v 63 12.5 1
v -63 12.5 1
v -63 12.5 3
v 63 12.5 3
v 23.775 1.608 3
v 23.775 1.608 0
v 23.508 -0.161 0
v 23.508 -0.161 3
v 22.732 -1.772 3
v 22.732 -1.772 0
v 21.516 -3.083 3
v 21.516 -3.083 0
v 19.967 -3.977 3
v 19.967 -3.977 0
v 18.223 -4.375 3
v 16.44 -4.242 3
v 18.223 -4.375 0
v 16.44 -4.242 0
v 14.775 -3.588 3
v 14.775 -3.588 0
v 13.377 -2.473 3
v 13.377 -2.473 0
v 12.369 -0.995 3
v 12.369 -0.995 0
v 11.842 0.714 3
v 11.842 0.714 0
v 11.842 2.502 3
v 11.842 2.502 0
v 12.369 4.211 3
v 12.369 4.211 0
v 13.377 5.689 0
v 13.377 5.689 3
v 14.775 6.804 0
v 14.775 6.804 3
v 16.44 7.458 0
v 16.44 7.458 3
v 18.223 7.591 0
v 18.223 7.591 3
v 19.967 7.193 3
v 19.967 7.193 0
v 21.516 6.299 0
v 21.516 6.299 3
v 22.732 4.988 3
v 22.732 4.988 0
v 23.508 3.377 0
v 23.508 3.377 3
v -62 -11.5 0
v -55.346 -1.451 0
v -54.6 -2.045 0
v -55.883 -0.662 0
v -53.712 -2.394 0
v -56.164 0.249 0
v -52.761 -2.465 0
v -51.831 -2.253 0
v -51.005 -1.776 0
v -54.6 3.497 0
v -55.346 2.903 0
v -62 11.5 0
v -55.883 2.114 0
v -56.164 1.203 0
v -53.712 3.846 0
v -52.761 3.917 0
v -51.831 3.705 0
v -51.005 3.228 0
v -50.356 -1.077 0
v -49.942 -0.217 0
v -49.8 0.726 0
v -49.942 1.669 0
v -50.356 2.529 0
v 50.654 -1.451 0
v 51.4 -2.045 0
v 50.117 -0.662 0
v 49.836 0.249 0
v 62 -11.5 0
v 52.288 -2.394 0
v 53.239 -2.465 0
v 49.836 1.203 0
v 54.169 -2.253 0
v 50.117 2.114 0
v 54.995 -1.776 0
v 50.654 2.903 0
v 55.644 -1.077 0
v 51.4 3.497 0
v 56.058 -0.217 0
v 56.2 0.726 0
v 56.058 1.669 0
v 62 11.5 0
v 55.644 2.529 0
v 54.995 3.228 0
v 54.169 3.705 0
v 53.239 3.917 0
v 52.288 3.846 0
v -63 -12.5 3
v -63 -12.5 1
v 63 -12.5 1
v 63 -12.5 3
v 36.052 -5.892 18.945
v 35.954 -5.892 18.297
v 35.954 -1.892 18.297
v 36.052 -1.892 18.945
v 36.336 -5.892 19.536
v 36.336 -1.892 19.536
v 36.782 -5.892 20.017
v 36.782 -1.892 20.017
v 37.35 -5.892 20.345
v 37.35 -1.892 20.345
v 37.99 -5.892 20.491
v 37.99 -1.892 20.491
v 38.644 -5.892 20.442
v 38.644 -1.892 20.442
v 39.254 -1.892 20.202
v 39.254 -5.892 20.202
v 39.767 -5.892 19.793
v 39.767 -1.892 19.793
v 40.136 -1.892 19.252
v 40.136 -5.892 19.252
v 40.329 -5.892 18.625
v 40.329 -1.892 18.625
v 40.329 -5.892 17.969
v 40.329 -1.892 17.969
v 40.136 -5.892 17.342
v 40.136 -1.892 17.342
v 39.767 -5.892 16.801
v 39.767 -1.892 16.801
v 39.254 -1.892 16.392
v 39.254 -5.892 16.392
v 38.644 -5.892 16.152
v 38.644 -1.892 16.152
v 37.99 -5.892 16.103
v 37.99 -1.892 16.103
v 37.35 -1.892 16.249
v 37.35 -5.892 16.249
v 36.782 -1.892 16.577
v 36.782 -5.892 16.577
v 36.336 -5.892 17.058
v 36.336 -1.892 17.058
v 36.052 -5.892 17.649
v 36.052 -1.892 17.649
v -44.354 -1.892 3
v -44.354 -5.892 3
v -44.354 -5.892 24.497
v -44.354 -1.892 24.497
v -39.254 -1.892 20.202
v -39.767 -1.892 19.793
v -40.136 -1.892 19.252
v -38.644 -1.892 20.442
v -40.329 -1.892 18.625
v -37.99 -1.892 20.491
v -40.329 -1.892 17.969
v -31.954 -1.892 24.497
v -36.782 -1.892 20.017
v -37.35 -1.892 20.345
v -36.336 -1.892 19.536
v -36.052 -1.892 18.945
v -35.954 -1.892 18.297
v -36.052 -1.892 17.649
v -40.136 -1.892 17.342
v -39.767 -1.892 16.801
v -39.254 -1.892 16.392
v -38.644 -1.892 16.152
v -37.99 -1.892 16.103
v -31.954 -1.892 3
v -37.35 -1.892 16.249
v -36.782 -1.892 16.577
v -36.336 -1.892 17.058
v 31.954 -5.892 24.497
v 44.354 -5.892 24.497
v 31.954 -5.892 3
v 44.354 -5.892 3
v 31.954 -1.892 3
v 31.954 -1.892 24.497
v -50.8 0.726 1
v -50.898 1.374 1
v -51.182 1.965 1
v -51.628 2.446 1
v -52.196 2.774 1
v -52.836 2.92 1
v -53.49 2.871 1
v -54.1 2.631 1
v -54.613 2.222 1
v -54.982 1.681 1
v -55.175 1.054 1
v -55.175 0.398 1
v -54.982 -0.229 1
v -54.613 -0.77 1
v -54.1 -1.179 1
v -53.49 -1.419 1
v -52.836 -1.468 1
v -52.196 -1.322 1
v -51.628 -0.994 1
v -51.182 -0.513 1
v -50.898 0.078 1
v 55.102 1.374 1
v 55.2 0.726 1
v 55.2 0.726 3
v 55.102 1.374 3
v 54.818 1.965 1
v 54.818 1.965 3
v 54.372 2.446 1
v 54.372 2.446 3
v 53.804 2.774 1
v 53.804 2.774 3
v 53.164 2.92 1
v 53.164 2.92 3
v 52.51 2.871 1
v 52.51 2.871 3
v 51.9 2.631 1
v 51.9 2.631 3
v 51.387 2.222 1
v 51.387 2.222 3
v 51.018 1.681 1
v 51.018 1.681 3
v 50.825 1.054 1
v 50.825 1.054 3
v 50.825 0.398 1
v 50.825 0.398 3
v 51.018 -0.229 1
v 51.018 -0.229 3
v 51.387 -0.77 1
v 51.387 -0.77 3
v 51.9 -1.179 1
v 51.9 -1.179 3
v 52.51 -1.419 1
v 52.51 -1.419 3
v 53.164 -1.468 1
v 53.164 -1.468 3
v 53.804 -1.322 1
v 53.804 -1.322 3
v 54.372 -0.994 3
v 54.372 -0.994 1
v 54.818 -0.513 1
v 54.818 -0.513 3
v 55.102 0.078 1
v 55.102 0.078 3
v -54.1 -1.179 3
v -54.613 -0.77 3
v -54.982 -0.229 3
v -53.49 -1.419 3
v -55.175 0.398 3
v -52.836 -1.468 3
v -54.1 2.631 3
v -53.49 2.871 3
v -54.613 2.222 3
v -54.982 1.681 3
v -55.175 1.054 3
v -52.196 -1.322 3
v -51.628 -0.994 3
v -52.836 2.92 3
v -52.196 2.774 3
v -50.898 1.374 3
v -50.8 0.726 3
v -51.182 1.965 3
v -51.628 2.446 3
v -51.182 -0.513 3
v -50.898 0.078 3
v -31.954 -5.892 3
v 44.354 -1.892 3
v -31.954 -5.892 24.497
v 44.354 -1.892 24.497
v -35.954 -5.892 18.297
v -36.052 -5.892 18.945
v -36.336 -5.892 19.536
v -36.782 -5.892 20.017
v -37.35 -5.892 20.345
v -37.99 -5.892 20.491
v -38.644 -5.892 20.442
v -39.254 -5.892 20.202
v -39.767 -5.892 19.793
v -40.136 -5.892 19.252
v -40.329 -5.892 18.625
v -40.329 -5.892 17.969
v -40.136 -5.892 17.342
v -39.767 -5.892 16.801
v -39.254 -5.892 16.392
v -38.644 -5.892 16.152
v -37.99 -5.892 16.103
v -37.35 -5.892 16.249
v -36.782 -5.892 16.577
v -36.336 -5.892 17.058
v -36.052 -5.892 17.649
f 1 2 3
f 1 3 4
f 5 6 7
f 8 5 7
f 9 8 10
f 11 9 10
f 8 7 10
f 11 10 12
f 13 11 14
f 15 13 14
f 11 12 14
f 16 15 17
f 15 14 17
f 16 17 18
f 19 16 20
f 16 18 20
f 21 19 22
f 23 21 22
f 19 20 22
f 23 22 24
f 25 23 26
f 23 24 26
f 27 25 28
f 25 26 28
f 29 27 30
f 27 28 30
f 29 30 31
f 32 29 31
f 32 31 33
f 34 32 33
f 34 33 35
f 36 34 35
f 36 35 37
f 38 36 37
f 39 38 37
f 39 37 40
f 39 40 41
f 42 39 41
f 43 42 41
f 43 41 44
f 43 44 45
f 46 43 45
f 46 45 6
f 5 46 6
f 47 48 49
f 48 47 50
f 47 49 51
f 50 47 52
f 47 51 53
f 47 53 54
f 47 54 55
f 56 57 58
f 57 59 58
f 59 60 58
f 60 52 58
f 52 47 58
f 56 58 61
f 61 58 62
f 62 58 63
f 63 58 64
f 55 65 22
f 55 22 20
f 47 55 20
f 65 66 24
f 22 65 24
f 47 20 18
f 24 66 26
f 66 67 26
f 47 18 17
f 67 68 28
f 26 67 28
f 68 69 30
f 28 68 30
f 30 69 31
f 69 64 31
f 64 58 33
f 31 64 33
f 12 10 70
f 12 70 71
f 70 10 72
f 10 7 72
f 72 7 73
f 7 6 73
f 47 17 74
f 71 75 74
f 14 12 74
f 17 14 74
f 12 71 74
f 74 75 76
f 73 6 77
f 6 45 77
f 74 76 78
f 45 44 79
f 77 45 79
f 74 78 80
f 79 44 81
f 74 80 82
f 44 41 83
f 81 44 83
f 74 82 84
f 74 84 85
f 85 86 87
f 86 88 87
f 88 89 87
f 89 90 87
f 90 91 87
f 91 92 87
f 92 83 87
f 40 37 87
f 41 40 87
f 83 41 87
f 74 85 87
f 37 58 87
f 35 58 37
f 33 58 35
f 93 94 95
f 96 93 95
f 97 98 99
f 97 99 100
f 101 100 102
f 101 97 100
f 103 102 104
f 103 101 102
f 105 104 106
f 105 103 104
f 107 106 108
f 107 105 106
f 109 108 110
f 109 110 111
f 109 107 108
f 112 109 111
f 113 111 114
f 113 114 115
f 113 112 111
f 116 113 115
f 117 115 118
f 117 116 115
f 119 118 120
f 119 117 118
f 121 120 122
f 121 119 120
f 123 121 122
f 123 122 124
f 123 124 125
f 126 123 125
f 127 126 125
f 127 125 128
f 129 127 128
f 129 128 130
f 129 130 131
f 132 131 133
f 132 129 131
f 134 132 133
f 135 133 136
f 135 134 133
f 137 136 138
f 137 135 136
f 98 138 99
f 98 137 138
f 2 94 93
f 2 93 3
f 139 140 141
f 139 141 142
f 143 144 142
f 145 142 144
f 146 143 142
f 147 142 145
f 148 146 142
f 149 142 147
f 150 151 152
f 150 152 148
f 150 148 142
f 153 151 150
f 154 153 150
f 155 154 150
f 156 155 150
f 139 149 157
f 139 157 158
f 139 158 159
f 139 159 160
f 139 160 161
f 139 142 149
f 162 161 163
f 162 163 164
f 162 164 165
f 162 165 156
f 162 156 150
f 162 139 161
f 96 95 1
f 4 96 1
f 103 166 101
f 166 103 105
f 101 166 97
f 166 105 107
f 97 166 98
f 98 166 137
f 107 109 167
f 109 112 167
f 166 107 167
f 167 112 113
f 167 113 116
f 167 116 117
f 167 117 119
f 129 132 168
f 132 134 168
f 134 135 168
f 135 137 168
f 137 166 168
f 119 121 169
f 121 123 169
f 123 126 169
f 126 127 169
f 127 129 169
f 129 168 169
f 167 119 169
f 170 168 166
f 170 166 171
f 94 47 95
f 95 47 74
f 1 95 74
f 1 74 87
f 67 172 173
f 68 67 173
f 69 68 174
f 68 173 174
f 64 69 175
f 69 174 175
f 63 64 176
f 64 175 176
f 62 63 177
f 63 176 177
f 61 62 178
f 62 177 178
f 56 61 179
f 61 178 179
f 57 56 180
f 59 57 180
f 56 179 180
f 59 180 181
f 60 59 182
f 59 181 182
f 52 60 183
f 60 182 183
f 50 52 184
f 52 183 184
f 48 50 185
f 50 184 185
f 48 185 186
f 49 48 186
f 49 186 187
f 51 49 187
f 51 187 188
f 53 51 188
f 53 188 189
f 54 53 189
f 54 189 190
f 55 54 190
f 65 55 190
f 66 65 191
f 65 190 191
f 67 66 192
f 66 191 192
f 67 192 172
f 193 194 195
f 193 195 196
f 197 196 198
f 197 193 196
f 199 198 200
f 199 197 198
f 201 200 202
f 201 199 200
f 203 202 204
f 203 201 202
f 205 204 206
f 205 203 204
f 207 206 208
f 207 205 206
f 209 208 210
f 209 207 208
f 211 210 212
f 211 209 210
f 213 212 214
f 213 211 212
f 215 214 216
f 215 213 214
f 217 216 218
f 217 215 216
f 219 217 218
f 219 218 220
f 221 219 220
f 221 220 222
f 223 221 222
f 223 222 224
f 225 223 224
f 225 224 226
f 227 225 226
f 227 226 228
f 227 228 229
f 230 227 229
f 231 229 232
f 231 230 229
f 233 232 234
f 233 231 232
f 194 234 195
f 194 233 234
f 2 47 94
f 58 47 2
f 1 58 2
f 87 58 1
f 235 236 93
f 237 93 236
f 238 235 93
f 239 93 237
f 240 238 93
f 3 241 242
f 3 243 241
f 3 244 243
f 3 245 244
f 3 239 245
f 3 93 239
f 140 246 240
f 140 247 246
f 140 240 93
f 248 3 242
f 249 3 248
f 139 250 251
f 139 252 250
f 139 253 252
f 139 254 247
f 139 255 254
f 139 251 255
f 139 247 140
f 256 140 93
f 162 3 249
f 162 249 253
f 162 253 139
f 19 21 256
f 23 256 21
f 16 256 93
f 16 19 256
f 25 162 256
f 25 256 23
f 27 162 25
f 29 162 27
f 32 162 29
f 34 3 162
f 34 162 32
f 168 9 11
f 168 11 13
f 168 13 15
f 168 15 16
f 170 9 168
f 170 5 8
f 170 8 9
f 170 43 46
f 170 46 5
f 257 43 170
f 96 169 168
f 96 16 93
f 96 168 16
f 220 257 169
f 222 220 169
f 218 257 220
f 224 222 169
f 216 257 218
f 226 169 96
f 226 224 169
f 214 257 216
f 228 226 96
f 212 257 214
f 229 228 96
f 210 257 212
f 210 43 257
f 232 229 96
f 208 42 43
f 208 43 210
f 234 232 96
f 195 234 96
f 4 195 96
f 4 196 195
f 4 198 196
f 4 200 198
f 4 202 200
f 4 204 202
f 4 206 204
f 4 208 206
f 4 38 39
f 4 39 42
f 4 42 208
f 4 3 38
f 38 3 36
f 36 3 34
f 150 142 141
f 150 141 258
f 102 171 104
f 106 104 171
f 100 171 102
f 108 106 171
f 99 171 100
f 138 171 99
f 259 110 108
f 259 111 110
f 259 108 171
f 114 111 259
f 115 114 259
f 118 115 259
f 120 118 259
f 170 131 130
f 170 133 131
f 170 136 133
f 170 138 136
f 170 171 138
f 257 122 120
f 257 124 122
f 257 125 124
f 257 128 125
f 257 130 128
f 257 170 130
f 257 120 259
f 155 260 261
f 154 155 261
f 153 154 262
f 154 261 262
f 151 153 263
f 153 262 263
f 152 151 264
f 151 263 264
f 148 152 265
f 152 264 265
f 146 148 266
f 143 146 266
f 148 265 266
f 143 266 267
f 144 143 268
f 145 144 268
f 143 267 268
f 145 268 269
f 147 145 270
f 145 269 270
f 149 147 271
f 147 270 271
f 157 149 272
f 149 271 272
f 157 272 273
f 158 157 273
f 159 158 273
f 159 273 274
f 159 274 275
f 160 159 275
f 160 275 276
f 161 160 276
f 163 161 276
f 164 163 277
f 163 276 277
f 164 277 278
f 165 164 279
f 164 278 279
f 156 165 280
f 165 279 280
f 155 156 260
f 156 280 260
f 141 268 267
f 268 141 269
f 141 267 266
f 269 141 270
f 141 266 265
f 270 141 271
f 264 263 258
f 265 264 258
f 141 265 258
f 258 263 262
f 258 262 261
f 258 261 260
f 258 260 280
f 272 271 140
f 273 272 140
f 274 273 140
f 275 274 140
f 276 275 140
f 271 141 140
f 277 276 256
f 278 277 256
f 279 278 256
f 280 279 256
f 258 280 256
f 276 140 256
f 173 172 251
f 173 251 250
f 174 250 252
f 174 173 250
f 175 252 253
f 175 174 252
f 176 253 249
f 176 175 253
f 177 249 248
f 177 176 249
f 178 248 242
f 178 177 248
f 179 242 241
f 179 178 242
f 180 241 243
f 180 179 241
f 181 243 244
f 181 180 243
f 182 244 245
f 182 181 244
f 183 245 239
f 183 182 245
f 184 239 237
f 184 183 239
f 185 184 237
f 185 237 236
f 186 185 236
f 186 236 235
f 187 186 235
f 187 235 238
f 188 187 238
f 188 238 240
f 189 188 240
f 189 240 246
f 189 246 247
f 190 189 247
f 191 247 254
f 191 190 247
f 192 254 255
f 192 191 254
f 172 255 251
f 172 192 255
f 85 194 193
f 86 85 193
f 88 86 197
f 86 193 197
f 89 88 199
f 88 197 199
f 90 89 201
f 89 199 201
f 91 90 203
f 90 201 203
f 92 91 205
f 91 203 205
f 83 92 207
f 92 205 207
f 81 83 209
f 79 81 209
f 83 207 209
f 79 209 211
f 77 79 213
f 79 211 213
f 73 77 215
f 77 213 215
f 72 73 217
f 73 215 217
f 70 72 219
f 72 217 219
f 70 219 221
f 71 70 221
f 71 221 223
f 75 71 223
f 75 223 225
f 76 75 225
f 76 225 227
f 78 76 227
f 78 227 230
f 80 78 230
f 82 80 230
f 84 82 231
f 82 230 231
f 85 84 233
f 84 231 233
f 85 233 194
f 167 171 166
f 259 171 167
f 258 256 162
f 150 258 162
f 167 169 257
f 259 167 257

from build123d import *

# Parameters (mm, degrees)
SKETCH_W        = 126
SKETCH_H        = 25
SKETCH_R        = 2.2
PAD_DEPTH       = 3
SKETCH001_W     = 12.4
SKETCH001_H     = 4
PAD001_DEPTH    = 21.497
SKETCH002_R     = 2.2
POCKET_DEPTH    = 4
CHAMFER_SIZE    = 1
SKETCH003_R     = 6
POCKET001_DEPTH = 24.498


with BuildPart() as part:
    # Sketch → Pad (new body)
    with BuildSketch(Plane.XY):
        Rectangle(SKETCH_W, SKETCH_H)
        with Locations((-53, 0.726)):
            Circle(SKETCH_R, mode=Mode.SUBTRACT)
        with Locations((53, 0.726)):
            Circle(SKETCH_R, mode=Mode.SUBTRACT)
    extrude(amount=PAD_DEPTH)

    # Sketch001 (on Face8 of Pad) → Pad001 (join)
    with BuildSketch(Plane.XY.offset(3)):
        with Locations((-38.154, -3.892)):
            Rectangle(SKETCH001_W, SKETCH001_H)
        with Locations((38.154, -3.892)):
            Rectangle(SKETCH001_W, SKETCH001_H)
    extrude(amount=PAD001_DEPTH)

    # Sketch002 (on Face11 of Pad001) → Pocket (cut)
    with BuildSketch(Plane.XZ.offset(5.892)):
        with Locations((-38.154, 18.297)):
            Circle(SKETCH002_R)
    pocket = extrude(amount=-POCKET_DEPTH, mode=Mode.SUBTRACT)

    # Mirrored: Pocket across Sketch002 V_Axis
    add(pocket.mirror(Plane(origin=(0, -5.892, 0), x_dir=(0, -1, 0), z_dir=(1, 0, 0))), mode=Mode.SUBTRACT)

    # Chamfer
    chamfer_edges = [part.edges().sort_by_distance(p)[0] for p in [
        (0, 12.5, 0),
        (63, 0, 0),
        (0, -12.5, 0),
        (-63, 0, 0),
        (50.8, 0.726, 0),
        (-55.2, 0.726, 0),
    ]]
    chamfer(chamfer_edges, length=CHAMFER_SIZE)

    # Sketch003 (on Face8 of Chamfer) → Pocket001 (cut, through all)
    with BuildSketch(Plane(origin=(0, 0, 0), x_dir=(1, 0, 0), z_dir=(0, 0, -1))):
        with Locations((17.775, -1.608)):
            Circle(SKETCH003_R)
    extrude(amount=-POCKET001_DEPTH, mode=Mode.SUBTRACT)


solid = part.part
